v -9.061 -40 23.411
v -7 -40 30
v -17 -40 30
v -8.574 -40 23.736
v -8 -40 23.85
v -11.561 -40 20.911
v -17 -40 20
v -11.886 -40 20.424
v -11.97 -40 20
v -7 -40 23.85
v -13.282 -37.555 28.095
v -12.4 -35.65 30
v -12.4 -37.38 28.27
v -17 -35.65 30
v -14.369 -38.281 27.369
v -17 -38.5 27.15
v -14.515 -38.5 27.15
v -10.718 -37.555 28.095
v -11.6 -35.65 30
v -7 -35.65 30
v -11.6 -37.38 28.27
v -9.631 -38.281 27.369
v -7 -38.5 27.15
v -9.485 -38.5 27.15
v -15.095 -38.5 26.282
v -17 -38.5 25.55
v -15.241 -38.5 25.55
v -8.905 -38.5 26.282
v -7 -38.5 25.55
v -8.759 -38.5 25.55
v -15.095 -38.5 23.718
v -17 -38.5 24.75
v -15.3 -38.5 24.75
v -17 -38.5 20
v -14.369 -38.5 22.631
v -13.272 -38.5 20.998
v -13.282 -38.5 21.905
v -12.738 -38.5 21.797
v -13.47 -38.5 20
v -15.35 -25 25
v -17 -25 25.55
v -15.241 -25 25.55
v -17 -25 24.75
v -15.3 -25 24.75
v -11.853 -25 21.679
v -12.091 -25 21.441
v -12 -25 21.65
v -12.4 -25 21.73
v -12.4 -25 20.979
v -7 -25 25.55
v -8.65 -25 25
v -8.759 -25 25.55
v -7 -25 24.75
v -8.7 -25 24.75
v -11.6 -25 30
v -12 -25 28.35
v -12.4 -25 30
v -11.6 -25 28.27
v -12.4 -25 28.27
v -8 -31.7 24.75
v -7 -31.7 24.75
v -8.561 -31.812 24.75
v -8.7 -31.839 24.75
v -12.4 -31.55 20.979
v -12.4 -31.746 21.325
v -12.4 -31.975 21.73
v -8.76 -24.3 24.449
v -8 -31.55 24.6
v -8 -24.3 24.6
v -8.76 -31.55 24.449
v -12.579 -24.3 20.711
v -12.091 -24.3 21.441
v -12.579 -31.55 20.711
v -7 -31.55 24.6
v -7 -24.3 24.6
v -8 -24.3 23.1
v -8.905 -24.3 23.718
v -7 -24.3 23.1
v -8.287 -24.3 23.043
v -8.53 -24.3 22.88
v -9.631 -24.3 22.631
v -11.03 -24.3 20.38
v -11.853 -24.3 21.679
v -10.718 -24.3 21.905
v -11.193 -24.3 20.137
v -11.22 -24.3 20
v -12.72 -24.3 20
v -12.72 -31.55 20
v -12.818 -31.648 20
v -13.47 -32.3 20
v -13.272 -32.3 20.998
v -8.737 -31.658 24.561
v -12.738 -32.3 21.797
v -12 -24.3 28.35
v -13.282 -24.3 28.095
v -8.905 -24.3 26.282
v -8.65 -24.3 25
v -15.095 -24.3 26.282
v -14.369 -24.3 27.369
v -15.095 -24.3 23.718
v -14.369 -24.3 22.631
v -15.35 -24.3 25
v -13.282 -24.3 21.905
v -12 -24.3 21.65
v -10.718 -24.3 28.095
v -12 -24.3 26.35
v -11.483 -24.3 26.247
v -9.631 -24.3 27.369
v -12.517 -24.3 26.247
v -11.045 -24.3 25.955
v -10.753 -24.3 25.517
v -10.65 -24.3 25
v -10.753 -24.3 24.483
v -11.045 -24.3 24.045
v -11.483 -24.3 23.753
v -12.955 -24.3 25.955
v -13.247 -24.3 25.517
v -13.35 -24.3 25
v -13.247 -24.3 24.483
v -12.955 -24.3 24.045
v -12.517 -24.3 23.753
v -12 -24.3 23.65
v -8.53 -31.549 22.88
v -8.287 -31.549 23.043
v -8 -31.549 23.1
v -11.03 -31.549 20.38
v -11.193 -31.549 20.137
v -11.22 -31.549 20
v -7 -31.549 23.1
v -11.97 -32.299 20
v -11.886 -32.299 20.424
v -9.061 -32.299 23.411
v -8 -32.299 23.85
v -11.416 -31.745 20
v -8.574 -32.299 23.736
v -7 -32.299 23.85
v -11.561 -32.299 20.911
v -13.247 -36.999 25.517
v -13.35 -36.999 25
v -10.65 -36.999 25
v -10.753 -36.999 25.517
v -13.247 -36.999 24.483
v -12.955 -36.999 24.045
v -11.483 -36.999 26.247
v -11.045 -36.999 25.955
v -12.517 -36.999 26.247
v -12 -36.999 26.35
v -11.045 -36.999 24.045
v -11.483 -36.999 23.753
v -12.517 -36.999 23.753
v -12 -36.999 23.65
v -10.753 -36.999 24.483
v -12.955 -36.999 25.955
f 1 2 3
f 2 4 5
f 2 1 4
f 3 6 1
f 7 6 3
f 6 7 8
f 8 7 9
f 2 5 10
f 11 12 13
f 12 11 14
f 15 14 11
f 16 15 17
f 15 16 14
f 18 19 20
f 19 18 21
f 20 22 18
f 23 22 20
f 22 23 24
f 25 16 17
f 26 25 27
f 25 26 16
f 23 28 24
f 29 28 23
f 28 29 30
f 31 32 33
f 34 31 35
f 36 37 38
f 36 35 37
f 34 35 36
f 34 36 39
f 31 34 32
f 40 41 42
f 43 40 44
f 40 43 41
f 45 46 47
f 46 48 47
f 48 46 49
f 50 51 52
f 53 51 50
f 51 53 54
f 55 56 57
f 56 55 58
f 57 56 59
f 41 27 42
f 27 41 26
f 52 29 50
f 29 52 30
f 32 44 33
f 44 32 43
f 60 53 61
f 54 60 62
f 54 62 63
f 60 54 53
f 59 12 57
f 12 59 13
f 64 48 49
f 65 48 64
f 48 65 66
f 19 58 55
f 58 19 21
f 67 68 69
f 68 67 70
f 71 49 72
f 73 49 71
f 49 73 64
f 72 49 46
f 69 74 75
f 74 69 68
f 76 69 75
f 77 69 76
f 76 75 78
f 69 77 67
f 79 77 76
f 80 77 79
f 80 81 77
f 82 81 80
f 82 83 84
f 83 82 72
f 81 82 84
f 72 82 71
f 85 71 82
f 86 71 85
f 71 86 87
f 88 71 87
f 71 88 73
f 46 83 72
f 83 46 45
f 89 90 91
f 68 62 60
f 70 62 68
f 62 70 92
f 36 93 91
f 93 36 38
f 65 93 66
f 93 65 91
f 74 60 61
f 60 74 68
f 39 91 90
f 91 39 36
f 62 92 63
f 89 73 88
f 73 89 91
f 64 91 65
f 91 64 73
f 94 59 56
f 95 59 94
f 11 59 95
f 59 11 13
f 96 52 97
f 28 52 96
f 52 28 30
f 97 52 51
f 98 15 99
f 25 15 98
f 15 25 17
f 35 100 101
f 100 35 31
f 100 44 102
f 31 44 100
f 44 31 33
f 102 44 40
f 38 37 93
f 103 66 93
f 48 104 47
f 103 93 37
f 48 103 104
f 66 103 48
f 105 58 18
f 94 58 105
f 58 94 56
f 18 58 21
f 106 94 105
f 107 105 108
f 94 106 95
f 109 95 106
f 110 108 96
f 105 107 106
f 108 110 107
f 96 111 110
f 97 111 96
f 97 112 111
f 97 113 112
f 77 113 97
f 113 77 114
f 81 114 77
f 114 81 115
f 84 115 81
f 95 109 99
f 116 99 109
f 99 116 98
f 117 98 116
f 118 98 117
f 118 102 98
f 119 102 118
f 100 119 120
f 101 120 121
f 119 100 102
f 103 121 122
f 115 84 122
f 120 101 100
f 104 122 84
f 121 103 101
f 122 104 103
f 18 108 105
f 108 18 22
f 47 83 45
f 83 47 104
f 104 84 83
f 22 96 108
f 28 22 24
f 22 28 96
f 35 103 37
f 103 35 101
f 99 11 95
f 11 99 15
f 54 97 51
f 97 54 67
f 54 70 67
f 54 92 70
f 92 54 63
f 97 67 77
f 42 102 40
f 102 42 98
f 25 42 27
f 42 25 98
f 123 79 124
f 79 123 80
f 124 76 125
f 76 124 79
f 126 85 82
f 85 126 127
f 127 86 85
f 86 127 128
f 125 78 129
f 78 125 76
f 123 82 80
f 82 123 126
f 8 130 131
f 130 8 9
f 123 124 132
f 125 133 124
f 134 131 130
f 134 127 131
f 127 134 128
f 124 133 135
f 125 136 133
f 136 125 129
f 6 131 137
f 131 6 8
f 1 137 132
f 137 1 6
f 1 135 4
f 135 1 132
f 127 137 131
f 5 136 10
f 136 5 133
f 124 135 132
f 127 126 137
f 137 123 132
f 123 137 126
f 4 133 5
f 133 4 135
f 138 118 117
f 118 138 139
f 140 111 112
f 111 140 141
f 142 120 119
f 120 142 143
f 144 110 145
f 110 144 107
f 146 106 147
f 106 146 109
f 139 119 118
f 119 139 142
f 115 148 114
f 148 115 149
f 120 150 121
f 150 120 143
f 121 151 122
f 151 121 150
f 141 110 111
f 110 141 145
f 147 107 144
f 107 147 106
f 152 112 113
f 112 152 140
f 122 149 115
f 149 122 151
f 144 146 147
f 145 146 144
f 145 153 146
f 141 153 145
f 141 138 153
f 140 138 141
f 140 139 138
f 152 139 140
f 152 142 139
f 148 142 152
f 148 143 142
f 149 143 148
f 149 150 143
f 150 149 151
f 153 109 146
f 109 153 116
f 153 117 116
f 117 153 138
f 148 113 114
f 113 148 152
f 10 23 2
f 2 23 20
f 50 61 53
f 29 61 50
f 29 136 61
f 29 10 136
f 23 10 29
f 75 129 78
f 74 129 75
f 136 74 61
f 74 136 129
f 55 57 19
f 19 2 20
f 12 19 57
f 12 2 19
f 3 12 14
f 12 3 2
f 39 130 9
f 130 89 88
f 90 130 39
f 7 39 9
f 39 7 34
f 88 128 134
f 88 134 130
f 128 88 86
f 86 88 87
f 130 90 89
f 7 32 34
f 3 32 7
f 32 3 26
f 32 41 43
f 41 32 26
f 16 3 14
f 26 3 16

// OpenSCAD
// file: xt.scad
e=.001;
$fn=16;

xt60_w=15.7;
xt60_h=8;
xt60f_d = 15.7;
xt60f_base_d = 8;
xt60_combined_d=24.1;
xt60_pitch=7;
xt60_chamfer=2.5;
xt60f_pin_d=5.7;
xt60m_pin_d=4.7;
xt60_pin_w=4.5;
xt60_hole_w=4.5;
xt60_corner=.5;

module xt_pins(width, height, pitch)
{
	for (p=[-pitch/2, pitch/2])
	translate([p,0,0])
	cylinder(h=height, r=width/2);
}

module xt_base(w, h, d, chamfer, corner, margin=0, e=0)
{
	w = w-2*corner;
	h = h-2*corner;
	r = corner+margin;
	translate([0,0,-e])
    linear_extrude(d+2*e)
	hull()
    for (p=[ [w/2,-h/2],
	         [-w/2+chamfer, -h/2],
	         [-w/2, -h/2+chamfer],
	         [-w/2, h/2-chamfer],
	         [-w/2+chamfer, h/2],
	         [w/2, h/2]
	])
	translate(p)
	circle(r);
}

module xt60_combined_shell_cutout(margin=0,f_margin=-1,m_margin=-1, e=0)
{
	b=1; 
	xt_base(xt60_w, xt60_h, xt60_combined_d, xt60_chamfer, xt60_corner, margin, e);
	if (f_margin > margin)
	hull()
	{
		xt_base(xt60_w, xt60_h, xt60f_base_d, xt60_chamfer, xt60_corner, f_margin, e);
		translate([0,0,xt60f_base_d])
		xt_base(xt60_w, xt60_h, f_margin-margin, xt60_chamfer, xt60_corner, margin, e);
	}
	if (m_margin > margin)
	hull()
	{
		translate([0,0,xt60f_base_d-(m_margin-margin)])
		xt_base(xt60_w, xt60_h, m_margin-margin, xt60_chamfer, xt60_corner, margin, e);
		translate([0,0,xt60f_base_d])
		xt_base(xt60_w, xt60_h, xt60_combined_d-xt60f_base_d, xt60_chamfer, xt60_corner, m_margin, e);
	}
}


module xt60_combined_cutout(margin=0,f_margin=-1,m_margin=-1, e=0)
{
	b=1; 
	xt60_combined_shell_cutout(margin,f_margin,m_margin, e);

	translate([0, 0, -xt60f_pin_d-margin])
	xt_pins(xt60_pin_w+margin*2, xt60f_pin_d+b+margin, xt60_pitch);

	translate([0, 0, xt60_combined_d-b])
	xt_pins(xt60_pin_w+margin*2, xt60m_pin_d+b+margin, xt60_pitch);
}

module xt60f_cutout(margin=0,f_margin=-1,m_margin=-1,e=0)
{
	translate([0,0,-xt60f_d])
	xt60_combined_cutout(margin,f_margin,m_margin,e);
}

module xt60f_shell_cutout(margin=0,f_margin=-1,m_margin=-1,e=0)
{
	translate([0,0,-xt60f_d])
	xt60_combined_shell_cutout(margin,f_margin,m_margin,e);
}

module xt60f()
{
	b=1;
	translate([0,0,-xt60f_d])
	{
		xt_base(xt60_w, xt60_h, xt60f_base_d, xt60_chamfer, xt60_corner, 0, e);

		translate([0,0,b])
		difference()
		{
			xt_base(xt60_w-2*xt60_corner, xt60_h-2*xt60_corner, xt60f_d-b, xt60_chamfer, xt60_corner, 0, e);
			xt_pins(xt60_hole_w, xt60f_d, xt60_pitch);

		}

		difference()
		{
			translate([0, 0, -xt60f_pin_d])
			xt_pins(xt60_pin_w, xt60f_pin_d+b, xt60_pitch);

			translate([0, 0, -xt60f_pin_d-b])
			xt_pins(xt60_pin_w*.8, xt60f_pin_d+b, xt60_pitch);
		}
	}
}

xt60f();
%xt60f_cutout(margin=.4,m_margin=1,e=e);
// file: power_shield.scad
use <utils.scad>
use <grid.scad>

use <mw_lrs.scad>
use <powerplug.scad>
use <xt.scad>

$fn=16;
e=.001;


margin=.15;
shield_thickness=1.;
shield_bottom=.6;

border_w=51;
border_h=31.2;
border_d=3.5;

w=47;
h=26.8;
d=22;
chamf=4;


flap_a_w=10;
flap_a_x=4;

flap_b_w=7;
flap_b_x=33;

flap_h=1;
flap_latch=.8;

corner=1;

module plug_keepout(margin=0, depth=39, e=0)
{
	$fn=16;

	d = .1+e;
	border_w = border_w-2*corner;
	border_h = border_h-2*corner;
	w = w-2*corner;
	h = h-2*corner;
	r = corner+margin;
	off = 16.5;

	color([.3,.3,.3])
	translate([corner,depth-.1,corner])
	rotate([90,0,0])
	{
		translate([(border_w-w)/2,0,-d])
		linear_extrude(d+e)
		hull()
		for (p=[ [off, 0],
		         [off, h],
		         [w-chamf, h],
		         [w, h-chamf],
		         [w, chamf],
		         [w- chamf, 0],
		])
		translate(p)
		circle(r);
	}
}

module plug_hull(margin, d, e=0)
{
	hull()
	{
		difference()
		{
		plug(margin=margin, extra_depth=5+shield_bottom);
		translate([-10,-10,-10])
		cube([100, 30, 100]);
		}
		plug_keepout(margin=margin, depth=d, e=0);
	}
	plug_keepout(margin=margin, depth=d, e=e);
	
}

inner_w=.8;

module power_shield()
{
color("red")
	union()
	{
	difference()
	{
		union()
		{
			plug_hull(margin=margin+shield_thickness, d=39);
		}
		union()
		{
		plug_hull(margin=margin, d=38, e=2);
		}
	}

	intersection()
	{
		plug_hull(margin=margin+shield_thickness/2, d=38.5, e=2);
		difference()
		{
			union()
			{
				translate([(border_w-w)/2+8.5-inner_w/2, 22, h/2-4-inner_w/2])
				cube([inner_w, 20, 20]);

				translate([(border_w-w)/2+8.5, 22, h/2-4-inner_w/2])
				cube([9., 17, inner_w]);

				translate([(border_w-w)/2+17.5-inner_w/2, 22, h/2-4-inner_w/2])
				cube([inner_w, 17, 10]);

				translate([(border_w-w)/2+15-inner_w/2, 38.4, h/2-4-inner_w/2])
				cube([2.5, shield_bottom, 10]);

				for (y=[0,h])
				for (x=[0,w-2])
				translate([(border_w-w)/2+x-5/sqrt(2)-inner_w/2, 22, y])
				rotate([0,45,0])
				cube([5,1,5]);

			}
			translate([(border_w-w)/2+6.5-inner_w/2, 21, h/2-6/2-inner_w/2])
			cube([5, 2, 5.5]);
		}
	}
}
}

power_shield();

//preview()
//plug();
// file: powerplug.scad
e=0.001;

border_w=51;
border_h=31.2;
border_d=3.5;

w=47;
h=26.8;
d=22;
chamf=4;


flap_a_w=10;
flap_a_x=4;

flap_b_w=7;
flap_b_x=33;

flap_h=1;
flap_latch=.8;

corner=1;

module plug(margin=0, extra_depth=0)
{
	$fn=16;

	d = d+extra_depth;
	border_w = border_w-2*corner;
	border_h = border_h-2*corner;
	w = w-2*corner;
	h = h-2*corner;
	r = corner+margin;

	color([.3,.3,.3])
	translate([corner,0,corner])
	rotate([90,0,0])
	{
		translate([0,(h-border_h)/2,0])
		linear_extrude(border_d+margin)
		hull()
		for(p=[ [0, 0],
		        [0, border_h],
		        [border_w, border_h],
		        [border_w, 0]
		])
		translate(p)
		circle(r);

		translate([(border_w-w)/2,0,-d])
		linear_extrude(d+e)
		hull()
		for (p=[ [0, 0],
		         [0, h],
		         [w-chamf, h],
		         [w, h-chamf],
		         [w, chamf],
		         [w- chamf, 0],
		])
		translate(p)
		circle(r);
	}
}

module plug_latch(margin=0)
{
	rotate([90,0,0])
	rotate([0,90,0])
	linear_extrude(9)
	{
		polygon([ [0, -1], [0, 1+margin], [9, margin]]);
	}
}

module plug_latches(margin=0)
{
	for (x=[9.5,32])
	for (y_flip=[-1, 1])
	translate([(border_w-w)/2+x,1.8, h/2])
	scale([1,1,y_flip])
	translate([0,0,h/2])
	plug_latch(margin);
}

plug();

plug_latches()

%plug(margin=.3);
// file: mw_lrs.scad
e=.001;
$fn=16;

mw_lrs_w=115;
mw_lrs_h=30;
mw_lrs_d=215;


mw_lrs_holes_pitch_d  = 150;
mw_lrs_holes_pitch_w  = 50;
mw_lrs_holes_height_h = 12.5;

mw_lrs_gap_h = 23;
mw_lrs_gap_d = 18.5;

mw_lrs_case_thickness = 1.6;

m4_thread = 4;

mw_lrs_screw_terminal_x=8.5;
mw_lrs_screw_terminal_w=88;
mw_lrs_screw_terminal_d=15;
mw_lrs_screw_terminal_h=15;
mw_lrs_screw_terminal_pitch = 9.5;
mw_lrs_screw_terminal_gap_w = 8;
mw_lrs_screw_terminal_gap_d = 14;
mw_lrs_screw_terminal_gap_z = 7;
mw_lrs_screw_terminal_gap_h = 6;

module mw_lrs_side_holes()
{
	translate( [0, 0, mw_lrs_holes_height_h] )
	for( r = [ 0, 180 ] )
	rotate( [0, r, 0] )
	for( y = [ (mw_lrs_d-mw_lrs_holes_pitch_d)/2, (mw_lrs_d+mw_lrs_holes_pitch_d)/2 ] )
	translate( [-mw_lrs_w/2, y, 0] )
	rotate( [0, 90, 0] )
	children();
}

module mw_lrs_bottom_holes()
{
	for( x = [ -mw_lrs_holes_pitch_w/2, mw_lrs_holes_pitch_w/2 ] )
	for( y = [ (mw_lrs_d-mw_lrs_holes_pitch_d)/2, (mw_lrs_d+mw_lrs_holes_pitch_d)/2 ] )
	translate( [x, y, 0] )
	children();
}

module mw_lrs_holes()
{
	mw_lrs_side_holes() children();
	mw_lrs_bottom_holes() children();
}

module mw_lrs_screw_terminal()
{
	colors = [
		"red", "red", "red",
		"black", "black", "black",
		"green", "blue", "brown",
	];
	b=1;
	translate([mw_lrs_screw_terminal_x, mw_lrs_case_thickness, mw_lrs_h-mw_lrs_gap_h-e])
	{
		difference()
		{
			translate([-mw_lrs_screw_terminal_w/2, 0, 0])
			cube([mw_lrs_screw_terminal_w, mw_lrs_screw_terminal_d, mw_lrs_screw_terminal_h+e]);
			for (i=[0:8])
			translate([(i-4)*9.5-mw_lrs_screw_terminal_gap_w/2, -b, mw_lrs_screw_terminal_gap_z])
			cube([mw_lrs_screw_terminal_gap_w, mw_lrs_screw_terminal_gap_d+b, mw_lrs_screw_terminal_gap_h]);
		}

		for (i=[0:8])
		translate([(i-4)*9.5-mw_lrs_screw_terminal_gap_w/2, -0, mw_lrs_screw_terminal_h])
		color(colors[i])
		cube([mw_lrs_screw_terminal_gap_w,mw_lrs_screw_terminal_gap_d,.1]);

	}
}

module mw_lrs_vents()
{
	b=1;
	hole=4;
	for (y = [36, 44, 52])
	for (i = [-1, 1])
	hull()
	{
		translate([i*(19/2+hole/2), y, mw_lrs_h-mw_lrs_case_thickness-b])
			cylinder(mw_lrs_case_thickness+2*b, r=hole/2);

		translate([i*(19/2+hole/2+33), y, mw_lrs_h-mw_lrs_case_thickness-b])
			cylinder(mw_lrs_case_thickness+2*b, r=hole/2);
	}

	translate([-mw_lrs_w/2+36.7, mw_lrs_d-47.45,mw_lrs_h-mw_lrs_case_thickness-b])
		cylinder(mw_lrs_case_thickness+2*b, r=50/2);
}

module mw_lrs_vents_keepout(h, margin=0)
{
	b=1;
	hole=4;
	hull()
	for (y = [36, 44, 52])
	for (i = [-1, 1])
	{
		translate([i*(19/2+hole/2), y, mw_lrs_h-b])
			cylinder(h+b, r=hole/2+margin);

		translate([i*(19/2+hole/2+33), y, mw_lrs_h-b])
			cylinder(h+b, r=hole/2+margin);
	}

	translate([-mw_lrs_w/2+36.7, mw_lrs_d-47.45,mw_lrs_h-b])
		cylinder(h+b, r=50/2);
}

module mw_lrs()
{
	b=1; 

	union()
	{
		color([.75,.75,.75])
		difference()
		{

			translate([-mw_lrs_w/2,0,0])
			cube([mw_lrs_w, mw_lrs_d, mw_lrs_h]);

			union()
			{
				translate([-mw_lrs_w/2+mw_lrs_case_thickness, -b, mw_lrs_h-mw_lrs_gap_h] )
				cube( [ mw_lrs_w-2*mw_lrs_case_thickness, b+mw_lrs_gap_d, mw_lrs_gap_h+b] );

				translate([-mw_lrs_w/2+mw_lrs_case_thickness, mw_lrs_gap_d-e, mw_lrs_h-mw_lrs_gap_h] )
				cube( [ mw_lrs_w-2*mw_lrs_case_thickness, mw_lrs_d-mw_lrs_gap_d+e-mw_lrs_case_thickness, mw_lrs_gap_h-mw_lrs_case_thickness] );

				mw_lrs_vents();

				mw_lrs_holes()
				{
					translate([0,0,-e])
					cylinder(h=5+e, r=m4_thread/2);
				}
			}
		}
		color([.1, .3, .1])
		translate([-mw_lrs_w/2+mw_lrs_case_thickness, 0, mw_lrs_h-mw_lrs_gap_h-e])
		cube([mw_lrs_w-2*mw_lrs_case_thickness, mw_lrs_d-mw_lrs_case_thickness, e+.1]);
		mw_lrs_screw_terminal();
	}
}

module mw_lrs_keepout(margin=0, e=0)
{
	b=1; 

	w=mw_lrs_w+margin*2;
	d=mw_lrs_d+margin*2;
	h=mw_lrs_h+margin*2;

	translate([-w/2,-margin,-margin])
	cube([w, d, h]);
}

mw_lrs();
%mw_lrs_keepout(margin=.4);

module m4_hole(h)
{
	translate([0,0,-h])
	cylinder(h=h+e, r=m4_thread/2);
}

%mw_lrs_holes()
m4_hole(10);
// file: grid.scad
module bars(width, height, n, pitch, bar_width, off)
{
	for (i=[0:n-1])
		translate([0, (i-(n-1)/2)*pitch-bar_width/2+off, 0])
			cube([width, bar_width, height]);
}

module grid(width, depth, height, n_rows, n_cols, pitch=10, x_pitch=-1, y_pitch=-1, bar_width=1, x_bar_width=-1, y_bar_width=-1, x_off=0, y_off=0)
{
	x_pitch = x_pitch > 0 ? x_pitch : pitch;
	y_pitch = y_pitch > 0 ? y_pitch : pitch;
	x_bar_width = x_bar_width > 0 ? x_bar_width : bar_width;
	y_bar_width = y_bar_width > 0 ? y_bar_width : bar_width;

	translate( [0, depth/2, 0] )
		bars( width, height, n_rows, y_pitch, y_bar_width, y_off );
	translate( [width/2, 0, 0] )
		rotate([0,0,90])
			bars( depth, height, n_cols, x_pitch, x_bar_width, -x_off) ;
}

grid(100, 50, 1, 4, 8);
// file: utils.scad
module xz_toward_y()
{
	scale([1, 1, -1])
	rotate([-90,0,0])
	children();
}

module anchor(dim, anchor=[0,0,0])
{
	translate([-(1+anchor.x)*dim.x/2, -(1+anchor.y)*dim.y/2, -(1+anchor.z)*dim.z/2])
	children();
}

module block(dim, anchor=[0,0,0])
{
	anchor(dim, anchor)
	cube(dim);
}

module rounded_block_y(dim, anchor=[0,0,0], r=0)
{
	anchor(dim, anchor)
	xz_toward_y()
	linear_extrude(dim.y)
	hull()
	for (p=[ [r,r], [dim.x-r, r], [dim.x-r, dim.z-r], [r, dim.z-r] ] )
	translate(p)
	circle(r);
}

module chamfer_block_y(dim, anchor=[0,0,0], r=0)
{
	anchor(dim, anchor)
	hull()
	{
		translate([r,0,0])
		cube([dim.x-r*2, dim.y, dim.z]);

		translate([0,0,r])
		cube([dim.x, dim.y, dim.z-r*2]);
	}
}

module chamfer_block(dim, anchor=[0,0,0], r=0)
{
	anchor(dim, anchor)
	hull()
	{
		translate([r,r,0])
		cube([dim.x-r*2, dim.y-r*2, dim.z]);

		translate([r,0,r])
		cube([dim.x-r*2, dim.y, dim.z-r*2]);

		translate([0,r,r])
		cube([dim.x, dim.y-r*2, dim.z-r*2]);
	}
}

module preview()
{
	if ($preview)
	children();
}
// file: cover.scad
use <utils.scad>
use <grid.scad>

use <mw_lrs.scad>
use <powerplug.scad>
use <power_shield.scad>
use <xt.scad>

$fn=16;
e=.001;

depth=40;

xt60_loc = [ [-47,-depth, 15], [-27,-depth, 15], [-7,-depth, 15] ];
plug_loc = [5,-depth, 1.5];

margin = 0.15;

xt60_margin = 0.25;
xt60m_margin = 1;

xt60_thickness = 1.5;
plug_thickness = 2;

case_w_inner = 115+2*margin;
case_h_inner = 30+2*margin;
case_thickness = 3;
case_front_thickness = 1.5;
case_w = case_w_inner + 2*case_thickness;
case_d = depth + 40;
case_h = case_h_inner + 2*case_thickness;

case_dim = [case_w, case_d, case_h];
case_dim_inner = [case_w_inner, case_d, case_h_inner];
case_dim_inside = [(case_w_inner+case_w)/2, case_d, (case_h_inner+case_h)/2];

bump_corner=(case_thickness+margin)*2.5;


front = [0,-1, 0];
bottom_front = [0,-1,-1];

grid_rows = 3;
grid_cols = 11;
grid_pitch = 10;
grid_thickness = .8;
grid_depth=12;
grid_xoff =-2;

screw_thread=3;
screw_hole_r=(screw_thread*.9)/2;
screw_hole_border=2;

mw_lrs_gap_d = 18.5;

preview()
{
	mw_lrs();

	for ( p = xt60_loc )
	translate(p)
	rotate([90,90,0])
	xt60f();

	translate(plug_loc)
	plug();

	translate(plug_loc)
	power_shield();
}

module cutout()
{
	mw_lrs_keepout(margin=margin);

	for ( p = xt60_loc )
	translate(p)
	translate([0,0,0])
	rotate([90,90,0])
	xt60f_cutout(margin=xt60_margin,m_margin=xt60m_margin,e=e);

	translate(plug_loc)
	{
	plug(margin=margin, , extra_depth=-2);
	plug_latches(margin=margin);
	}

	mw_lrs_holes()
	m4_hole(10);

	mw_lrs_vents_keepout(h=10, margin=1);
}

module shell()
{
	difference()
	{
		translate([0, -depth, -case_thickness-margin])
		rounded_block_y(case_dim, bottom_front, r=case_thickness);

		translate([0, -depth+case_front_thickness, -margin])
		chamfer_block([case_w_inner, case_d, case_h_inner], bottom_front, r=case_thickness);
	}
}

module round_corner(w)
{
	difference()
	{
		rotate([90,0,0])
		cylinder(w, r1=w, r2=0);
		union()
		{
			translate([-w-e,-w,-w])
			cube([w,w*2,w*2]);

			translate([-w,-w,-w-e])
			cube([w*2,w*2,w]);
		}
	}
}


module bump_corner(w)
{
	round_corner(w, $fn=4);
}

module front_grid()
{
	translate([0, -depth+e,-case_thickness/2])
	xz_toward_y()
	anchor(case_dim_inside, bottom_front)
	grid(case_dim_inside.x, case_dim_inside.z, case_thickness+grid_depth-e, grid_rows, grid_cols, pitch=grid_pitch, bar_width=grid_thickness, x_off=grid_xoff, y_off=0);
}

module at_panel_screws()
{
	for (x=[ -12, -42 ])
	for (z=[ 5, 25 ])
	translate([x,-depth, z])
	children();
}


module cover()
{
	difference()
	{
		union()
		{
			shell();
	
			intersection()
			{
				union()
				{
					front_grid();
					translate(plug_loc)
					plug(margin=margin+plug_thickness, extra_depth=-2);
	
					for ( p = xt60_loc )
					translate(p)
					rotate([90,90,0])
					xt60f_shell_cutout(margin=  xt60_margin+xt60_thickness,
					                 m_margin=xt60m_margin+xt60_thickness);

					at_panel_screws()
					translate([0,-e, 0])
					xz_toward_y()
					linear_extrude(15.7+e)
					circle(screw_hole_r+screw_hole_border);

				}
				translate([0, -depth+e, case_h_inner/2])
				block(case_dim_inside, front);
			}

			translate([0,-margin,case_h_inner/2-margin])
			for (x=[1, -1])
			for (z=[1, -1])
			scale([x, 1, z])
			translate([-case_w_inner/2, 0,-case_h_inner/2])
			bump_corner(bump_corner);
		}
		union()
		{
			cutout();

			at_panel_screws()
			translate([0,case_thickness+e, 0])
			xz_toward_y()
			linear_extrude(15.7)
			circle(screw_hole_r);
		}
	}
}

#cover();
// main file
use <cover.scad>

color("red")
intersection()
{
	translate([-17.,-40,20])
	cube([10, 30, 10]);
	cover();
}
